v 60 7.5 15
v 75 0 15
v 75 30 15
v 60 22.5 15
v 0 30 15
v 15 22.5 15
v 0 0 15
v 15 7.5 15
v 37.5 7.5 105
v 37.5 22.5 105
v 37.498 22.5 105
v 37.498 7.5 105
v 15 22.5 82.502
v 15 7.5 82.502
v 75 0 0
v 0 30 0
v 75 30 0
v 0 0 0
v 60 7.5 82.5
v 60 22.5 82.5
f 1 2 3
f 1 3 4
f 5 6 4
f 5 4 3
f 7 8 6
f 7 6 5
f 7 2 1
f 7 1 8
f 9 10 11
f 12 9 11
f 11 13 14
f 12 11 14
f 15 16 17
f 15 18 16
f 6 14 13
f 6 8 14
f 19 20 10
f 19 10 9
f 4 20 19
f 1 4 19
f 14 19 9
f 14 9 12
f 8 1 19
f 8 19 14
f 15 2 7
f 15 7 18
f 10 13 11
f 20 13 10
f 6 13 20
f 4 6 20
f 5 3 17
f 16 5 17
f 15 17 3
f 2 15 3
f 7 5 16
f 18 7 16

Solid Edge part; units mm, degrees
sketch "Sketch1" plane through (0, 0, 0) normal (0, -1, 0) x (1, 0, 0)
  line L0 (75, 15) -> (0, 15)
  line L1 (0, 15) -> (0, 0)
  line L2 (0, 0) -> (75, 0)
  line L3 (75, 0) -> (75, 15)
extrude "Protrusion1" add sketch "Sketch1" against normal blind 30
sketch "Sketch2" plane through (37.5, 15, 15) normal (0, 0, 1) x (1, 0, 0)
  line L0 (-22.5, 7.5) -> (22.5, 7.5)
  line L1 (22.5, 7.5) -> (22.5, -7.5)
  line L2 (22.5, -7.5) -> (-22.5, -7.5)
  line L3 (-22.5, -7.5) -> (-22.5, 7.5)
extrude "ExtrudedProtrusion_2" add sketch "Sketch2" along normal blind 90
chamfer "Chamfer_4" distance 22.5 angle 45 1 edges at (60, 15, 105)
chamfer "Chamfer_5" distance 22.5 angle 45 1 edges at (15, 15, 105)
